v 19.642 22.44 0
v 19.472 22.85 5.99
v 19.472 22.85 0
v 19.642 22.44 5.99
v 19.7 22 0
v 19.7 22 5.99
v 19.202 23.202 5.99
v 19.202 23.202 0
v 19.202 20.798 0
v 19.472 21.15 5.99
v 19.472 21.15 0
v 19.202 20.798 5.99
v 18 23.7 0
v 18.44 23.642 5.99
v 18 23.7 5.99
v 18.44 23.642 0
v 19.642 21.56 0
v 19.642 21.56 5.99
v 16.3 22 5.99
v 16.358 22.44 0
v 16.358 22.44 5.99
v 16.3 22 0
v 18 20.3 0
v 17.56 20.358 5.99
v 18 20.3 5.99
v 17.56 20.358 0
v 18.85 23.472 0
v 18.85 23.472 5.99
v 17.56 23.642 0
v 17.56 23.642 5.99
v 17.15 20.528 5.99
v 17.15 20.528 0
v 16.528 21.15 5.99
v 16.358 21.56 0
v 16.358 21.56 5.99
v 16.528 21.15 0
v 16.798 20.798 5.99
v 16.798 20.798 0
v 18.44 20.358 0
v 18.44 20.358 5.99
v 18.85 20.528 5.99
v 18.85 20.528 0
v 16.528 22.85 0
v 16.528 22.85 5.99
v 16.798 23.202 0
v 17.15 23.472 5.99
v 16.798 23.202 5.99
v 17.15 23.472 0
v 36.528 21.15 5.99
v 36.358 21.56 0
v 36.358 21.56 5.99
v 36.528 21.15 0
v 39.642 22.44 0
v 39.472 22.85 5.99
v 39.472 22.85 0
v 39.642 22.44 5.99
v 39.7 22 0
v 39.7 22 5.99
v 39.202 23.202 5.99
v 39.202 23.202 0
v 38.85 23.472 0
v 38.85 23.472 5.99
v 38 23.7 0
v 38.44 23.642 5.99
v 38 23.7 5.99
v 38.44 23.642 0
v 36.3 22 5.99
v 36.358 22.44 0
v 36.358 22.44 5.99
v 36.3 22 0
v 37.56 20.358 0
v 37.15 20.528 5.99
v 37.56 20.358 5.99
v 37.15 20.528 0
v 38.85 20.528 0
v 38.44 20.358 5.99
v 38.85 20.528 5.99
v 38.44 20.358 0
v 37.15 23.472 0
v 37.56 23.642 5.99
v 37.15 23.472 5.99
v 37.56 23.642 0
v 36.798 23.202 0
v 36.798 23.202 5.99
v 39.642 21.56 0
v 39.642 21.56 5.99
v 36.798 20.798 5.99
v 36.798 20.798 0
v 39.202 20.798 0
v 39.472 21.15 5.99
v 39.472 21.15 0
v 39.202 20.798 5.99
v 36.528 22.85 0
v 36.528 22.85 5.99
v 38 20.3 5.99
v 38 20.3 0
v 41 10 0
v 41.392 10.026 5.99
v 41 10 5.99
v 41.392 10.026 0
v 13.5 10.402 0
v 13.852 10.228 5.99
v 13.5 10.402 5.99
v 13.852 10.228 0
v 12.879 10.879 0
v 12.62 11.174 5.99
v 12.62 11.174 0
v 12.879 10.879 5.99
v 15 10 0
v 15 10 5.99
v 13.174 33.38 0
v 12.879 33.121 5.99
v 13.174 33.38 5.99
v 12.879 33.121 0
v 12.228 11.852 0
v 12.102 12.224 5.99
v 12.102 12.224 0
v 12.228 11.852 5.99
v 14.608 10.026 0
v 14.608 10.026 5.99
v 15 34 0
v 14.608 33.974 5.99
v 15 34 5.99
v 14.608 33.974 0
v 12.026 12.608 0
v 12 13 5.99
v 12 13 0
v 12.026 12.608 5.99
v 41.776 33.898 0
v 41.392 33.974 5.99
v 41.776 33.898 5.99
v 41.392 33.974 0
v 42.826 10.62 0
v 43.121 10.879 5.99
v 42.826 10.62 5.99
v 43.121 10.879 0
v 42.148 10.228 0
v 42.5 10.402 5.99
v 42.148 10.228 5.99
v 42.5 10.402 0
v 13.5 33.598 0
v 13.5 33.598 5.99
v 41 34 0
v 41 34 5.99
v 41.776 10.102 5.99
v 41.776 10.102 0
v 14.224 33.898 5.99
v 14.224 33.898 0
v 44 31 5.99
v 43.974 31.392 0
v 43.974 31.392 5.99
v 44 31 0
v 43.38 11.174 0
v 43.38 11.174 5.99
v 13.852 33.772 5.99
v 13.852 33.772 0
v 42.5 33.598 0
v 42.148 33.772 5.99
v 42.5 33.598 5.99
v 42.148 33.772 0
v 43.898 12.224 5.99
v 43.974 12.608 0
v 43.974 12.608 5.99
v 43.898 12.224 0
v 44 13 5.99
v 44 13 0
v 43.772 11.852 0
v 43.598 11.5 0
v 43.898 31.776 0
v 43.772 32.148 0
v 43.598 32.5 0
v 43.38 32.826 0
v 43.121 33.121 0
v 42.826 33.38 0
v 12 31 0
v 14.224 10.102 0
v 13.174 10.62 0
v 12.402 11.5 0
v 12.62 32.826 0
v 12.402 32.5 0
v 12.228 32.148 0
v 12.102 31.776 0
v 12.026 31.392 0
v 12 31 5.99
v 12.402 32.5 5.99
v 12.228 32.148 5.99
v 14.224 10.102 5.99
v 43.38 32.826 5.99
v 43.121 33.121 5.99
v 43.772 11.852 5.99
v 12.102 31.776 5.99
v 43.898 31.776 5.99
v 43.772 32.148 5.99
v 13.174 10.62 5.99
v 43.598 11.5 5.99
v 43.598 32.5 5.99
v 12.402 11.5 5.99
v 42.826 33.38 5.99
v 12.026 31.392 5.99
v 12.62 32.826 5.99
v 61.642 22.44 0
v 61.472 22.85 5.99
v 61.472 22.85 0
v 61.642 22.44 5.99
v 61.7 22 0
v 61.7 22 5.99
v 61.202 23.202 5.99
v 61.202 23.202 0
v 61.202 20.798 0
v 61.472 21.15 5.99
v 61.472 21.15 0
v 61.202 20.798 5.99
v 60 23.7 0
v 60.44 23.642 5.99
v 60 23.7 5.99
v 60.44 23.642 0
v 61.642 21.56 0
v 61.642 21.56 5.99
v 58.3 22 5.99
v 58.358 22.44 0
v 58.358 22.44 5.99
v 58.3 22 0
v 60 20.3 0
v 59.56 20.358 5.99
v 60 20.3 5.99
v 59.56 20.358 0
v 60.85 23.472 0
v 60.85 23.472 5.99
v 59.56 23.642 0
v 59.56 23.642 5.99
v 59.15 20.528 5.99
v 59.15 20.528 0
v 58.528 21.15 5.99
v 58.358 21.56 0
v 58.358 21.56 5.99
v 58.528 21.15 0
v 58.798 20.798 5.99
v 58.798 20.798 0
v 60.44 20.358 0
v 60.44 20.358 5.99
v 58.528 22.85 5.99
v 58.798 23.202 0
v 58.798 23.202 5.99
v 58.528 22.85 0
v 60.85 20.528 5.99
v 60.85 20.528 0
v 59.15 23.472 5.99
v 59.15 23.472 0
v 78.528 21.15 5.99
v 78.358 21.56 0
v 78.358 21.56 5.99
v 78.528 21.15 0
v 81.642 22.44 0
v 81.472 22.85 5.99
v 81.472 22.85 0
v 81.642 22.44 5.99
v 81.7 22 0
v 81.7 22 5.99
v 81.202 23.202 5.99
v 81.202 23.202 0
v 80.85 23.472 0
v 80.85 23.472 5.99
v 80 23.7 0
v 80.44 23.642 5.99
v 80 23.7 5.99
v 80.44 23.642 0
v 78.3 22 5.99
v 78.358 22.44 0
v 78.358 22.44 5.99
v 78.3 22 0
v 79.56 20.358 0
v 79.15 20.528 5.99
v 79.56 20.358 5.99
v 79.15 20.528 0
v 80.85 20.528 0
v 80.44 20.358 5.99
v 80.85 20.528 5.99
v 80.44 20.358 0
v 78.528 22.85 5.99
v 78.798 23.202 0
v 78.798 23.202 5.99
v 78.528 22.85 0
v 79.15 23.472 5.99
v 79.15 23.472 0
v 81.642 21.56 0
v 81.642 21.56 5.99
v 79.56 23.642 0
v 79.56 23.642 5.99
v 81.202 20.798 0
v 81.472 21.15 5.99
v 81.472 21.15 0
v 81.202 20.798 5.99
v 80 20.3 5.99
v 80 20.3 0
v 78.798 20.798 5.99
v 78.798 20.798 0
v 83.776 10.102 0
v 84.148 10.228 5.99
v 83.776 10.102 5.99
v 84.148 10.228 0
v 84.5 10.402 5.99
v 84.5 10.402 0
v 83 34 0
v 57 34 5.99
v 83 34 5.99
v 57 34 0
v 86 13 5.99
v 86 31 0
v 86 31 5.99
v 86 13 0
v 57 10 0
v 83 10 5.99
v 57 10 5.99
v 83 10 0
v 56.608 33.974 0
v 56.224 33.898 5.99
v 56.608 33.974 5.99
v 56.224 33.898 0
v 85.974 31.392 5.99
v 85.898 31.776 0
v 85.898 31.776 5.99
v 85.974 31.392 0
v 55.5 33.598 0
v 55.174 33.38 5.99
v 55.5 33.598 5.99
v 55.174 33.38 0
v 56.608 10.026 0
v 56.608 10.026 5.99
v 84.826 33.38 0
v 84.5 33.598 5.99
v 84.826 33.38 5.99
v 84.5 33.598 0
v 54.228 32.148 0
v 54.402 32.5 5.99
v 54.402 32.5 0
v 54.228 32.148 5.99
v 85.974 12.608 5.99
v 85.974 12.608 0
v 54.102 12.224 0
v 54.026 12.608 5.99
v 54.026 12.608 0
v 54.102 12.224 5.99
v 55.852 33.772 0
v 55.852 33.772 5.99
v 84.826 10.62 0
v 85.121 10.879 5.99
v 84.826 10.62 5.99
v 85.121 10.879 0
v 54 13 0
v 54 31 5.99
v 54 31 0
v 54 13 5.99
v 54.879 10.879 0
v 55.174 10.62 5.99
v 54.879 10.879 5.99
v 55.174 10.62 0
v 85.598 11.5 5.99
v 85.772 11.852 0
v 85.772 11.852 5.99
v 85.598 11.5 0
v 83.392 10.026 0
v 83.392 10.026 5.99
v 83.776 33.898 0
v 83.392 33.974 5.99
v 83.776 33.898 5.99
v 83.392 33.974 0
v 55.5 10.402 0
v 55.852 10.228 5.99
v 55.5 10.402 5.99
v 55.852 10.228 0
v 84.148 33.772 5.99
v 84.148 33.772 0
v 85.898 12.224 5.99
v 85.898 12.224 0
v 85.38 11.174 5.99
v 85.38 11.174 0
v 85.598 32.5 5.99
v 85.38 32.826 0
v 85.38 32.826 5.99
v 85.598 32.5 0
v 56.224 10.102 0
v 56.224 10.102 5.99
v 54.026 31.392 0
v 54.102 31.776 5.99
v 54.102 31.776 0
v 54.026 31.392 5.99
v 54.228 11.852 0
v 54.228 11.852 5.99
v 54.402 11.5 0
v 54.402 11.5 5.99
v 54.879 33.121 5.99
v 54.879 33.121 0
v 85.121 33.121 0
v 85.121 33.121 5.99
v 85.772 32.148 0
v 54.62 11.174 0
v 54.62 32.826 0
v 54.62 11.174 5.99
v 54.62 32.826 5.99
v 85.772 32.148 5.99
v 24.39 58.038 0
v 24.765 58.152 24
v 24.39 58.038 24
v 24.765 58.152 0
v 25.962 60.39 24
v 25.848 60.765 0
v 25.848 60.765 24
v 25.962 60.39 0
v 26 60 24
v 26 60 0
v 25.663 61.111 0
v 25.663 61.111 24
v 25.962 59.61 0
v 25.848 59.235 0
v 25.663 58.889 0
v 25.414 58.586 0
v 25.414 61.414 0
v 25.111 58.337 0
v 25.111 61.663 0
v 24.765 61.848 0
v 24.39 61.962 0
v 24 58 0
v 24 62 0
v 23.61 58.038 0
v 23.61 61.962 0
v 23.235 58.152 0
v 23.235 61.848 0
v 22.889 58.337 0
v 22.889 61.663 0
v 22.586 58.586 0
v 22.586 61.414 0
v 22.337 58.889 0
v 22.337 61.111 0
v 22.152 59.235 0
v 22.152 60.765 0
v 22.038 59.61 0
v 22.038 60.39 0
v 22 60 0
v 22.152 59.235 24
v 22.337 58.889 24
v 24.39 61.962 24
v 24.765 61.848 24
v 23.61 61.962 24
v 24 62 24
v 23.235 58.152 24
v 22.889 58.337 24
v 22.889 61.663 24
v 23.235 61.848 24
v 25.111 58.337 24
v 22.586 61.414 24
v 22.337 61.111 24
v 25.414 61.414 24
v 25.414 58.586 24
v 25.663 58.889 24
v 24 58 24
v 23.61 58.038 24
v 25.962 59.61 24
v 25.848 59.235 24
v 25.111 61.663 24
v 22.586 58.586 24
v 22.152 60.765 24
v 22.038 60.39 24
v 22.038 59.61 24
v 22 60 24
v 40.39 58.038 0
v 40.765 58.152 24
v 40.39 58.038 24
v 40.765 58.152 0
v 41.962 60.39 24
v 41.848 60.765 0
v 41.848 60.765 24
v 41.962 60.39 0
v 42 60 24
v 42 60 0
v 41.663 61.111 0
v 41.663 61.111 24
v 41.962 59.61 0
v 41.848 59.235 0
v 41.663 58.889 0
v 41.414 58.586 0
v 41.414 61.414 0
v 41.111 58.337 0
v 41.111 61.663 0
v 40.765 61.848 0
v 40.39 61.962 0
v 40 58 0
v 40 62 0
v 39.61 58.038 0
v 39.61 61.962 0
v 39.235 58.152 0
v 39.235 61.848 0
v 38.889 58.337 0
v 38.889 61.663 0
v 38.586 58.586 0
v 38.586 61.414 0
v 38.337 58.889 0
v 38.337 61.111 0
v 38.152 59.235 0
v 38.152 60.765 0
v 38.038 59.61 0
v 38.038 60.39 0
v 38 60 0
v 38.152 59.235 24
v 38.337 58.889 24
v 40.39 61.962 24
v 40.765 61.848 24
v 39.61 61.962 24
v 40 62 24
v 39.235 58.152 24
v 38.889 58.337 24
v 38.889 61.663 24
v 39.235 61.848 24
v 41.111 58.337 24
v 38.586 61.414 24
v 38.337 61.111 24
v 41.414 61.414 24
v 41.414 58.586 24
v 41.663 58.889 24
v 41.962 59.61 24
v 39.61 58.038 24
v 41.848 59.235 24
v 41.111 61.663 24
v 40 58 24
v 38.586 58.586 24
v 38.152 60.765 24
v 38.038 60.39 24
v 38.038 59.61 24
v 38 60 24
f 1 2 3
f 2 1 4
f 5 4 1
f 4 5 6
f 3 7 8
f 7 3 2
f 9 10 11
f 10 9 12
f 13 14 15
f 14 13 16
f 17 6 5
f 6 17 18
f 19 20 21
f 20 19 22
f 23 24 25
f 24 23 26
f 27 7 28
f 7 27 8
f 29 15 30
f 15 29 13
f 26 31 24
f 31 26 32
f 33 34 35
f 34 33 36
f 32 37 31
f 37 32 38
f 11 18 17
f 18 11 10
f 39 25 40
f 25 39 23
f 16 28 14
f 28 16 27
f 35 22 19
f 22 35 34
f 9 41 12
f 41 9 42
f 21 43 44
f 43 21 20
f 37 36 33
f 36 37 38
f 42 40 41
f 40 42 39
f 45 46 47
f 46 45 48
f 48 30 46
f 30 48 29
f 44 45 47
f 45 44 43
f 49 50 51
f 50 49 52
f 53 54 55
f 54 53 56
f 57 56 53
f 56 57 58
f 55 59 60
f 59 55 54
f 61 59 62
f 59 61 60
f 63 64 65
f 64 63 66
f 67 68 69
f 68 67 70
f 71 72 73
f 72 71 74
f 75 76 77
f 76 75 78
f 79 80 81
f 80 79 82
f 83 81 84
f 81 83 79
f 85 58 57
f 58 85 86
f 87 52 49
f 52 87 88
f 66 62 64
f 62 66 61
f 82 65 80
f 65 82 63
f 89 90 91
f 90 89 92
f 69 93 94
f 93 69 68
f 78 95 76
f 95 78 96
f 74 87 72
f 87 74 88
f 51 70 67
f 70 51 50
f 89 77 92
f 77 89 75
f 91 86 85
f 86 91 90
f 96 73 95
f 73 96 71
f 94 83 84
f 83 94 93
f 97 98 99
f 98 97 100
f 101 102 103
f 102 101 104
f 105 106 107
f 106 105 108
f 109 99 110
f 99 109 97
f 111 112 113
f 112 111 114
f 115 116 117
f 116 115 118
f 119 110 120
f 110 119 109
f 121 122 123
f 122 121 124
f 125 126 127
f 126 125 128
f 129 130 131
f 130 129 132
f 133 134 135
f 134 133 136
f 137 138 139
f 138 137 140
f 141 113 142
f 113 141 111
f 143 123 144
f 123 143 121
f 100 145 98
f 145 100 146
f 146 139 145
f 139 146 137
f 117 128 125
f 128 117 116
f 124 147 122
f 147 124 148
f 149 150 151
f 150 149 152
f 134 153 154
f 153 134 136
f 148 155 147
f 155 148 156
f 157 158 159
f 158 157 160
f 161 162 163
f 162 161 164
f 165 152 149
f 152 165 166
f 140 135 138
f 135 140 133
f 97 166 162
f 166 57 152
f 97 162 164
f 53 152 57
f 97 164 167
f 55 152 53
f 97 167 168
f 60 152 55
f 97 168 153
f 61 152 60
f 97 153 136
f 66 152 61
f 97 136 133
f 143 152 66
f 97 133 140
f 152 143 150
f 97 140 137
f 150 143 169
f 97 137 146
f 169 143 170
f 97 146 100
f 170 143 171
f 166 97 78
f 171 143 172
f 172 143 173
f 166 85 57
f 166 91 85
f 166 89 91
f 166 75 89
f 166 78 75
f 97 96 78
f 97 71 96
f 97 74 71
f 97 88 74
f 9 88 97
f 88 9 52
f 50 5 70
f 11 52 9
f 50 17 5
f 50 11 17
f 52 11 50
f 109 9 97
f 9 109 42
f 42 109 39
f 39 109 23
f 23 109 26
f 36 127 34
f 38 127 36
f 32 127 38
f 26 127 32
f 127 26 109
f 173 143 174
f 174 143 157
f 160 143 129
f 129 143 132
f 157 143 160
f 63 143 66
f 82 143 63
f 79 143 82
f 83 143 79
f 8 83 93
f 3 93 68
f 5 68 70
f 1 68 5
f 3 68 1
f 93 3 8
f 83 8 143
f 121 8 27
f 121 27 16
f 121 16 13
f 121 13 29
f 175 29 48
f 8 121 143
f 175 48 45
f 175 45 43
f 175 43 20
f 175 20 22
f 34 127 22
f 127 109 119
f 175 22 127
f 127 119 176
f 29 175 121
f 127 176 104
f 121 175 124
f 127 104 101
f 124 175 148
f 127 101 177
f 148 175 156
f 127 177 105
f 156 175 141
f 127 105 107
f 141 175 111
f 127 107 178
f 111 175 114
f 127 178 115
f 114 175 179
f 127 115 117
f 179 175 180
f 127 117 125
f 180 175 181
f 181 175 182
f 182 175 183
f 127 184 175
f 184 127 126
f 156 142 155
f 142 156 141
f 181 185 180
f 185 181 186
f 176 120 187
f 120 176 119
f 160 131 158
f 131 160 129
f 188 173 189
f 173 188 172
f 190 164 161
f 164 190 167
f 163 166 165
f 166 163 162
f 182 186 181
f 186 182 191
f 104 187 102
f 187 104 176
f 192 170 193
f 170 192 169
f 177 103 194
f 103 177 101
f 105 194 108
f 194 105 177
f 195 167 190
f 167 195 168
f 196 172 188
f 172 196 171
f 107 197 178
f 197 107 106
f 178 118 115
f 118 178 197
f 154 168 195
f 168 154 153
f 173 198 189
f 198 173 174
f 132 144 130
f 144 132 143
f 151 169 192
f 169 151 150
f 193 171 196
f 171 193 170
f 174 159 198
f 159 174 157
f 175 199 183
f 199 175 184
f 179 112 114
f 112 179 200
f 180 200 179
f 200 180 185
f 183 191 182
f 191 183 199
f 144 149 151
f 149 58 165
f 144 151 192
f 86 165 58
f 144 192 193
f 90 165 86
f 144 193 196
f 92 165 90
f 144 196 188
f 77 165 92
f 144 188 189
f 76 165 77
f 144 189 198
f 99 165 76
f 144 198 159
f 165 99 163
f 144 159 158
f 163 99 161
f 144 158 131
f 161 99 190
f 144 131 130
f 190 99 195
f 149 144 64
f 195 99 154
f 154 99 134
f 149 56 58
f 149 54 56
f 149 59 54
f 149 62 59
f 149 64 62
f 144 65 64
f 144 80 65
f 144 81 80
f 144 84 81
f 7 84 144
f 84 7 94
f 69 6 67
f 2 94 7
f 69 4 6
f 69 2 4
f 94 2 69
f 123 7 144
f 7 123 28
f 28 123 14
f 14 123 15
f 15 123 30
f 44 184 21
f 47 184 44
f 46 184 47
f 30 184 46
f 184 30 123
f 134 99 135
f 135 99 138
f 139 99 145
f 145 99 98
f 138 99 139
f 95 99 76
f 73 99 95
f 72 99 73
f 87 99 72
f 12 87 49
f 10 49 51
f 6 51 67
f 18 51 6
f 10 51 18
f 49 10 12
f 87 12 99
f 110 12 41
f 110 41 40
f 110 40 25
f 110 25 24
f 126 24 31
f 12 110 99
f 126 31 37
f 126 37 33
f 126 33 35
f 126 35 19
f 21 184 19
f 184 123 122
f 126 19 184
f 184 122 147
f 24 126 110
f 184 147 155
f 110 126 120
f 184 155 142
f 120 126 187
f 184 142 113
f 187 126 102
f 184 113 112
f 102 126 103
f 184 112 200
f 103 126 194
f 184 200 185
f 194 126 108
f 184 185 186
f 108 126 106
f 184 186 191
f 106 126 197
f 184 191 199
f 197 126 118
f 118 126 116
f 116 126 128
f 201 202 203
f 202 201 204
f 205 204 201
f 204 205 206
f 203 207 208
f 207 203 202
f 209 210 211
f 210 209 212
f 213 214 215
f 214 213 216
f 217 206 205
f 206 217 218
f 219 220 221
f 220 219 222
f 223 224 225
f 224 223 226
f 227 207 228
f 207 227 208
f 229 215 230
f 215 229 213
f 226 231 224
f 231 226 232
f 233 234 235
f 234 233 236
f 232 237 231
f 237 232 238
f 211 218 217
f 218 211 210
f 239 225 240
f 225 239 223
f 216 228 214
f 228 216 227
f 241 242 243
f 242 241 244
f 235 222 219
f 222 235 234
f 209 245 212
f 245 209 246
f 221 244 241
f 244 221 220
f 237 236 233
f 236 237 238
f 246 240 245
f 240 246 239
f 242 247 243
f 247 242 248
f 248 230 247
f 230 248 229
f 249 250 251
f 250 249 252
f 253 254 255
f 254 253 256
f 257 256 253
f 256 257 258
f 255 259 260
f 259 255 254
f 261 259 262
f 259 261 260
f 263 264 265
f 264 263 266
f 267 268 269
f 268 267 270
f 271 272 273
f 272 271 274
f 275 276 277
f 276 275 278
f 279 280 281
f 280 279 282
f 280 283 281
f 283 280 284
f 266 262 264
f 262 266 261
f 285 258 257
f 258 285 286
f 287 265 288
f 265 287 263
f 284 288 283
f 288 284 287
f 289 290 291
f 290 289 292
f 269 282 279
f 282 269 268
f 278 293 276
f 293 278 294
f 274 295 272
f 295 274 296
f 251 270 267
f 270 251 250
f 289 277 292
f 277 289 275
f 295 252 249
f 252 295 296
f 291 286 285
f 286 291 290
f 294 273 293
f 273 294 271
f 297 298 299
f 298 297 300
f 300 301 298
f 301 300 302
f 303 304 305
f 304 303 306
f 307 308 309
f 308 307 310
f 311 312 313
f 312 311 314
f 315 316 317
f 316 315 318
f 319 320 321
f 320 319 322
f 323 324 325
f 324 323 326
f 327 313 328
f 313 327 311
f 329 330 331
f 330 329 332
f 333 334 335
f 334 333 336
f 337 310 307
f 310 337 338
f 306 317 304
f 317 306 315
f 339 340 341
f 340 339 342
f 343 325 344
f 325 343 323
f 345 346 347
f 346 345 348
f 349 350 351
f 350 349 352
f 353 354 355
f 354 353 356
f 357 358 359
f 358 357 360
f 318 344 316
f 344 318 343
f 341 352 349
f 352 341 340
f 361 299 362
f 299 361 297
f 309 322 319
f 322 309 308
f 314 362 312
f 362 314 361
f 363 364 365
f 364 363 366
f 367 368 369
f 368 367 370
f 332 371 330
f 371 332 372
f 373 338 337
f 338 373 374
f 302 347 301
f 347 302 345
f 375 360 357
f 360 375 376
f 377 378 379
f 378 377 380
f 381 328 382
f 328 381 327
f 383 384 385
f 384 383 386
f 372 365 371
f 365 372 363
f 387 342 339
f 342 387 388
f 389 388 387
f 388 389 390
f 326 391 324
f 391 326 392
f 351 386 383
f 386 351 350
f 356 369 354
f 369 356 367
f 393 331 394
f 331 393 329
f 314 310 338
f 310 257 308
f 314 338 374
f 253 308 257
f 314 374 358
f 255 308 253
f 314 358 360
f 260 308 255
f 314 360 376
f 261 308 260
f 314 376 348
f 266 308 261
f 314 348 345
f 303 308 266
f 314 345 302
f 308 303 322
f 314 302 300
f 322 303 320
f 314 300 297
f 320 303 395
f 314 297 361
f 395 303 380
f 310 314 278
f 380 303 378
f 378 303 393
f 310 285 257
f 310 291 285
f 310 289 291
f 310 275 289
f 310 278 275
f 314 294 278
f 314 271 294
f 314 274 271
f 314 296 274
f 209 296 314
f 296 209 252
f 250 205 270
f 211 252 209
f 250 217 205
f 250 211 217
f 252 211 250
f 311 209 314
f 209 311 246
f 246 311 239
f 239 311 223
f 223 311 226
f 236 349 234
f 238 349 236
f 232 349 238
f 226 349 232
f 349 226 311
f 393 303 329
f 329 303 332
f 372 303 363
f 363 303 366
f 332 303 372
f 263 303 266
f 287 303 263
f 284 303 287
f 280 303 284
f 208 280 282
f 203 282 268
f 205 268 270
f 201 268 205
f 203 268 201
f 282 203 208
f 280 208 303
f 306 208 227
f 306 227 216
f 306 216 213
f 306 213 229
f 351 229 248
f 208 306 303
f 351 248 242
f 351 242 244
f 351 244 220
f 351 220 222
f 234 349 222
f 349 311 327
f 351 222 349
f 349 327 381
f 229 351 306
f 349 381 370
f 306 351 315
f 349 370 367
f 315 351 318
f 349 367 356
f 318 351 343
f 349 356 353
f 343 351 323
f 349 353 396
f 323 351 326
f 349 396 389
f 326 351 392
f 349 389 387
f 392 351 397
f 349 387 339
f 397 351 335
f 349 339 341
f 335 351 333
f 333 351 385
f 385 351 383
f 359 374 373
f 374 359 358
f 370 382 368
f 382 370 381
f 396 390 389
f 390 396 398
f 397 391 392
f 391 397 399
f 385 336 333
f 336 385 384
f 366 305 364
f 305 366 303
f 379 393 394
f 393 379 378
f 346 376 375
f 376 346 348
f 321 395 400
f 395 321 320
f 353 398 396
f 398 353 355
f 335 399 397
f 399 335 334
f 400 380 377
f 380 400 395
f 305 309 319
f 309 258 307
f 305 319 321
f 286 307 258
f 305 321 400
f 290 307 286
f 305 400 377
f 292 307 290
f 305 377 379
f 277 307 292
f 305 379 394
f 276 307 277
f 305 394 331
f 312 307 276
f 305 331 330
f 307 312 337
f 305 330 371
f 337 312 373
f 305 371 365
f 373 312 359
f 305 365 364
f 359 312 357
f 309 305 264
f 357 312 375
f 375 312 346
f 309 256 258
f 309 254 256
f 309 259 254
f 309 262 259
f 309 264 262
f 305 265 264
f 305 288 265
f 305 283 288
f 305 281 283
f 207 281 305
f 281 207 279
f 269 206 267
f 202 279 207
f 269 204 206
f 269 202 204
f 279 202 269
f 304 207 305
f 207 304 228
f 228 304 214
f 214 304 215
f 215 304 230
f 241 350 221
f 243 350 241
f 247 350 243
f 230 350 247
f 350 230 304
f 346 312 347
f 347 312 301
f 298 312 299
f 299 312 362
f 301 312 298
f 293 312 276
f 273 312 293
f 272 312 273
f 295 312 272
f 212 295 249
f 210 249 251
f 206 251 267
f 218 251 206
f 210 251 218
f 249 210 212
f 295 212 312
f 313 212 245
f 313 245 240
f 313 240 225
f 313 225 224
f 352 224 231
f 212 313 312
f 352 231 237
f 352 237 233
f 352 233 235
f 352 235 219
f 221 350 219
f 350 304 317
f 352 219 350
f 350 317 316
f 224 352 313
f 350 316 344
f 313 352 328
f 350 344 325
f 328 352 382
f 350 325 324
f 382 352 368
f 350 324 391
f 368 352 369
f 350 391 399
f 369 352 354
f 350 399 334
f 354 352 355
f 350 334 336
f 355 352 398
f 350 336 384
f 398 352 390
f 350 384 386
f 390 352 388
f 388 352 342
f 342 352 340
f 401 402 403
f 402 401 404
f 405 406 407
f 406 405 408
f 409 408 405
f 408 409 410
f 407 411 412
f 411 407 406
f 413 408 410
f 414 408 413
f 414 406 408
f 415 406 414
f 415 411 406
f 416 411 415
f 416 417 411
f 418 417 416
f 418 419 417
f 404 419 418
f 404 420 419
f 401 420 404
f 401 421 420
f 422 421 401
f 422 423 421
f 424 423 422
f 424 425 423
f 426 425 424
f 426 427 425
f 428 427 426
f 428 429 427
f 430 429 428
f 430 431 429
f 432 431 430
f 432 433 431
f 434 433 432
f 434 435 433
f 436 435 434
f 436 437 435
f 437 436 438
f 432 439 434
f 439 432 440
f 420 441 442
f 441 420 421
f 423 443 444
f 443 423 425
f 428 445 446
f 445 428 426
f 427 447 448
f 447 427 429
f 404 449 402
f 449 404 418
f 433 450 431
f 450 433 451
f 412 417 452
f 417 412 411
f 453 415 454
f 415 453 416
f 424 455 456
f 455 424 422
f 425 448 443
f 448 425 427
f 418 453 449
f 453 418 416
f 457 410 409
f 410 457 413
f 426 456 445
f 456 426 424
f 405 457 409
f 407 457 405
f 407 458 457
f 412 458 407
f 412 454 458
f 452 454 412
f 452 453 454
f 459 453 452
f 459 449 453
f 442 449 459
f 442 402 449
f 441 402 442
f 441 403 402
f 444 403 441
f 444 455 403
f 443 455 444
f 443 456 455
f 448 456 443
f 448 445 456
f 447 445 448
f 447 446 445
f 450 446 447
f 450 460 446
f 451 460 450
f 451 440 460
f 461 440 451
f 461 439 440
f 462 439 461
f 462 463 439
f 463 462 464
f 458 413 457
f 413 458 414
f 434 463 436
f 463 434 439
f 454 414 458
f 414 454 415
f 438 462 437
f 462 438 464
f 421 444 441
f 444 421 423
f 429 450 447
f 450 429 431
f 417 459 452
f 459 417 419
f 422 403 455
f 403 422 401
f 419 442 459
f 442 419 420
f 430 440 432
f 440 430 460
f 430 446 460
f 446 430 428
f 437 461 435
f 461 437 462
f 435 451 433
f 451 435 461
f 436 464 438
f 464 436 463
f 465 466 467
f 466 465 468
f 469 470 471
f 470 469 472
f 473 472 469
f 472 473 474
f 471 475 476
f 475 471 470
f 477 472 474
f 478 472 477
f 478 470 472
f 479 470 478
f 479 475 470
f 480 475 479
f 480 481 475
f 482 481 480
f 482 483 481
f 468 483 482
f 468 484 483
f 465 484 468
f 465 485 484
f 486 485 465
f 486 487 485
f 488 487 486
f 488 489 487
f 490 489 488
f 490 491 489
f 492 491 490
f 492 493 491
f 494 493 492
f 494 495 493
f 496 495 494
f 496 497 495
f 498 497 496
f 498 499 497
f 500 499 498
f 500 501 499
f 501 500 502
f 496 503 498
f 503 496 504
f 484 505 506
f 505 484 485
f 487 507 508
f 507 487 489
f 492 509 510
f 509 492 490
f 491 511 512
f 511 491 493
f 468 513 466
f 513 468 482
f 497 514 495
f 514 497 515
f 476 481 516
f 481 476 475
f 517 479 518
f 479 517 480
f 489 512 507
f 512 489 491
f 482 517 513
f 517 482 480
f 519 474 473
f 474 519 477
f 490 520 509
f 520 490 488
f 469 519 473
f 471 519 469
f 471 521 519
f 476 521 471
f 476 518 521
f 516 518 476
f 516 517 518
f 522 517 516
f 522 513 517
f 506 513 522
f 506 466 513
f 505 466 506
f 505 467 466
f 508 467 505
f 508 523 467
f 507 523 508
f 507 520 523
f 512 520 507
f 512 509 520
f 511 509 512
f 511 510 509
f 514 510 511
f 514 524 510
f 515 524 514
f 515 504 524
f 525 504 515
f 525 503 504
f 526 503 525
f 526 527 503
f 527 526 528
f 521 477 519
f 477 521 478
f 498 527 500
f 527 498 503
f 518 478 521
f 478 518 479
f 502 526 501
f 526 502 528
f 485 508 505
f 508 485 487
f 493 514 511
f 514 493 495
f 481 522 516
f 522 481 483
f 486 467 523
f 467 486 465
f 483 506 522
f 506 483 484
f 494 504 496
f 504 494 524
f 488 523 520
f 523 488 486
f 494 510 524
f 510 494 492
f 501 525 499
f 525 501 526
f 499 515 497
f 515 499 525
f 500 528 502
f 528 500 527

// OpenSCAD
/*
Sample 109: Geteilte Wellen-Klemmkupplung — 4-mm-Welle
Generated from the FDM Mechanical Sample Library.
Units: millimetres.

Override examples:
  openscad -o custom.stl -D 'view="plate"' -D 'render_fn=64' model.scad
  openscad -o preview.png -D 'view="assembly"' model.scad
*/
use <../../../library/fdm_mechanisms.scad>

render_fn = is_undef(render_fn) ? 48 : render_fn;
view = is_undef(view) ? "plate" : view;
$fn = render_fn;

sample_shaft_coupler(
    view=view,
    bore_d=4,
    clearance=0.15,
    screw_d=3.4,
    nut_flat=5.7
);
